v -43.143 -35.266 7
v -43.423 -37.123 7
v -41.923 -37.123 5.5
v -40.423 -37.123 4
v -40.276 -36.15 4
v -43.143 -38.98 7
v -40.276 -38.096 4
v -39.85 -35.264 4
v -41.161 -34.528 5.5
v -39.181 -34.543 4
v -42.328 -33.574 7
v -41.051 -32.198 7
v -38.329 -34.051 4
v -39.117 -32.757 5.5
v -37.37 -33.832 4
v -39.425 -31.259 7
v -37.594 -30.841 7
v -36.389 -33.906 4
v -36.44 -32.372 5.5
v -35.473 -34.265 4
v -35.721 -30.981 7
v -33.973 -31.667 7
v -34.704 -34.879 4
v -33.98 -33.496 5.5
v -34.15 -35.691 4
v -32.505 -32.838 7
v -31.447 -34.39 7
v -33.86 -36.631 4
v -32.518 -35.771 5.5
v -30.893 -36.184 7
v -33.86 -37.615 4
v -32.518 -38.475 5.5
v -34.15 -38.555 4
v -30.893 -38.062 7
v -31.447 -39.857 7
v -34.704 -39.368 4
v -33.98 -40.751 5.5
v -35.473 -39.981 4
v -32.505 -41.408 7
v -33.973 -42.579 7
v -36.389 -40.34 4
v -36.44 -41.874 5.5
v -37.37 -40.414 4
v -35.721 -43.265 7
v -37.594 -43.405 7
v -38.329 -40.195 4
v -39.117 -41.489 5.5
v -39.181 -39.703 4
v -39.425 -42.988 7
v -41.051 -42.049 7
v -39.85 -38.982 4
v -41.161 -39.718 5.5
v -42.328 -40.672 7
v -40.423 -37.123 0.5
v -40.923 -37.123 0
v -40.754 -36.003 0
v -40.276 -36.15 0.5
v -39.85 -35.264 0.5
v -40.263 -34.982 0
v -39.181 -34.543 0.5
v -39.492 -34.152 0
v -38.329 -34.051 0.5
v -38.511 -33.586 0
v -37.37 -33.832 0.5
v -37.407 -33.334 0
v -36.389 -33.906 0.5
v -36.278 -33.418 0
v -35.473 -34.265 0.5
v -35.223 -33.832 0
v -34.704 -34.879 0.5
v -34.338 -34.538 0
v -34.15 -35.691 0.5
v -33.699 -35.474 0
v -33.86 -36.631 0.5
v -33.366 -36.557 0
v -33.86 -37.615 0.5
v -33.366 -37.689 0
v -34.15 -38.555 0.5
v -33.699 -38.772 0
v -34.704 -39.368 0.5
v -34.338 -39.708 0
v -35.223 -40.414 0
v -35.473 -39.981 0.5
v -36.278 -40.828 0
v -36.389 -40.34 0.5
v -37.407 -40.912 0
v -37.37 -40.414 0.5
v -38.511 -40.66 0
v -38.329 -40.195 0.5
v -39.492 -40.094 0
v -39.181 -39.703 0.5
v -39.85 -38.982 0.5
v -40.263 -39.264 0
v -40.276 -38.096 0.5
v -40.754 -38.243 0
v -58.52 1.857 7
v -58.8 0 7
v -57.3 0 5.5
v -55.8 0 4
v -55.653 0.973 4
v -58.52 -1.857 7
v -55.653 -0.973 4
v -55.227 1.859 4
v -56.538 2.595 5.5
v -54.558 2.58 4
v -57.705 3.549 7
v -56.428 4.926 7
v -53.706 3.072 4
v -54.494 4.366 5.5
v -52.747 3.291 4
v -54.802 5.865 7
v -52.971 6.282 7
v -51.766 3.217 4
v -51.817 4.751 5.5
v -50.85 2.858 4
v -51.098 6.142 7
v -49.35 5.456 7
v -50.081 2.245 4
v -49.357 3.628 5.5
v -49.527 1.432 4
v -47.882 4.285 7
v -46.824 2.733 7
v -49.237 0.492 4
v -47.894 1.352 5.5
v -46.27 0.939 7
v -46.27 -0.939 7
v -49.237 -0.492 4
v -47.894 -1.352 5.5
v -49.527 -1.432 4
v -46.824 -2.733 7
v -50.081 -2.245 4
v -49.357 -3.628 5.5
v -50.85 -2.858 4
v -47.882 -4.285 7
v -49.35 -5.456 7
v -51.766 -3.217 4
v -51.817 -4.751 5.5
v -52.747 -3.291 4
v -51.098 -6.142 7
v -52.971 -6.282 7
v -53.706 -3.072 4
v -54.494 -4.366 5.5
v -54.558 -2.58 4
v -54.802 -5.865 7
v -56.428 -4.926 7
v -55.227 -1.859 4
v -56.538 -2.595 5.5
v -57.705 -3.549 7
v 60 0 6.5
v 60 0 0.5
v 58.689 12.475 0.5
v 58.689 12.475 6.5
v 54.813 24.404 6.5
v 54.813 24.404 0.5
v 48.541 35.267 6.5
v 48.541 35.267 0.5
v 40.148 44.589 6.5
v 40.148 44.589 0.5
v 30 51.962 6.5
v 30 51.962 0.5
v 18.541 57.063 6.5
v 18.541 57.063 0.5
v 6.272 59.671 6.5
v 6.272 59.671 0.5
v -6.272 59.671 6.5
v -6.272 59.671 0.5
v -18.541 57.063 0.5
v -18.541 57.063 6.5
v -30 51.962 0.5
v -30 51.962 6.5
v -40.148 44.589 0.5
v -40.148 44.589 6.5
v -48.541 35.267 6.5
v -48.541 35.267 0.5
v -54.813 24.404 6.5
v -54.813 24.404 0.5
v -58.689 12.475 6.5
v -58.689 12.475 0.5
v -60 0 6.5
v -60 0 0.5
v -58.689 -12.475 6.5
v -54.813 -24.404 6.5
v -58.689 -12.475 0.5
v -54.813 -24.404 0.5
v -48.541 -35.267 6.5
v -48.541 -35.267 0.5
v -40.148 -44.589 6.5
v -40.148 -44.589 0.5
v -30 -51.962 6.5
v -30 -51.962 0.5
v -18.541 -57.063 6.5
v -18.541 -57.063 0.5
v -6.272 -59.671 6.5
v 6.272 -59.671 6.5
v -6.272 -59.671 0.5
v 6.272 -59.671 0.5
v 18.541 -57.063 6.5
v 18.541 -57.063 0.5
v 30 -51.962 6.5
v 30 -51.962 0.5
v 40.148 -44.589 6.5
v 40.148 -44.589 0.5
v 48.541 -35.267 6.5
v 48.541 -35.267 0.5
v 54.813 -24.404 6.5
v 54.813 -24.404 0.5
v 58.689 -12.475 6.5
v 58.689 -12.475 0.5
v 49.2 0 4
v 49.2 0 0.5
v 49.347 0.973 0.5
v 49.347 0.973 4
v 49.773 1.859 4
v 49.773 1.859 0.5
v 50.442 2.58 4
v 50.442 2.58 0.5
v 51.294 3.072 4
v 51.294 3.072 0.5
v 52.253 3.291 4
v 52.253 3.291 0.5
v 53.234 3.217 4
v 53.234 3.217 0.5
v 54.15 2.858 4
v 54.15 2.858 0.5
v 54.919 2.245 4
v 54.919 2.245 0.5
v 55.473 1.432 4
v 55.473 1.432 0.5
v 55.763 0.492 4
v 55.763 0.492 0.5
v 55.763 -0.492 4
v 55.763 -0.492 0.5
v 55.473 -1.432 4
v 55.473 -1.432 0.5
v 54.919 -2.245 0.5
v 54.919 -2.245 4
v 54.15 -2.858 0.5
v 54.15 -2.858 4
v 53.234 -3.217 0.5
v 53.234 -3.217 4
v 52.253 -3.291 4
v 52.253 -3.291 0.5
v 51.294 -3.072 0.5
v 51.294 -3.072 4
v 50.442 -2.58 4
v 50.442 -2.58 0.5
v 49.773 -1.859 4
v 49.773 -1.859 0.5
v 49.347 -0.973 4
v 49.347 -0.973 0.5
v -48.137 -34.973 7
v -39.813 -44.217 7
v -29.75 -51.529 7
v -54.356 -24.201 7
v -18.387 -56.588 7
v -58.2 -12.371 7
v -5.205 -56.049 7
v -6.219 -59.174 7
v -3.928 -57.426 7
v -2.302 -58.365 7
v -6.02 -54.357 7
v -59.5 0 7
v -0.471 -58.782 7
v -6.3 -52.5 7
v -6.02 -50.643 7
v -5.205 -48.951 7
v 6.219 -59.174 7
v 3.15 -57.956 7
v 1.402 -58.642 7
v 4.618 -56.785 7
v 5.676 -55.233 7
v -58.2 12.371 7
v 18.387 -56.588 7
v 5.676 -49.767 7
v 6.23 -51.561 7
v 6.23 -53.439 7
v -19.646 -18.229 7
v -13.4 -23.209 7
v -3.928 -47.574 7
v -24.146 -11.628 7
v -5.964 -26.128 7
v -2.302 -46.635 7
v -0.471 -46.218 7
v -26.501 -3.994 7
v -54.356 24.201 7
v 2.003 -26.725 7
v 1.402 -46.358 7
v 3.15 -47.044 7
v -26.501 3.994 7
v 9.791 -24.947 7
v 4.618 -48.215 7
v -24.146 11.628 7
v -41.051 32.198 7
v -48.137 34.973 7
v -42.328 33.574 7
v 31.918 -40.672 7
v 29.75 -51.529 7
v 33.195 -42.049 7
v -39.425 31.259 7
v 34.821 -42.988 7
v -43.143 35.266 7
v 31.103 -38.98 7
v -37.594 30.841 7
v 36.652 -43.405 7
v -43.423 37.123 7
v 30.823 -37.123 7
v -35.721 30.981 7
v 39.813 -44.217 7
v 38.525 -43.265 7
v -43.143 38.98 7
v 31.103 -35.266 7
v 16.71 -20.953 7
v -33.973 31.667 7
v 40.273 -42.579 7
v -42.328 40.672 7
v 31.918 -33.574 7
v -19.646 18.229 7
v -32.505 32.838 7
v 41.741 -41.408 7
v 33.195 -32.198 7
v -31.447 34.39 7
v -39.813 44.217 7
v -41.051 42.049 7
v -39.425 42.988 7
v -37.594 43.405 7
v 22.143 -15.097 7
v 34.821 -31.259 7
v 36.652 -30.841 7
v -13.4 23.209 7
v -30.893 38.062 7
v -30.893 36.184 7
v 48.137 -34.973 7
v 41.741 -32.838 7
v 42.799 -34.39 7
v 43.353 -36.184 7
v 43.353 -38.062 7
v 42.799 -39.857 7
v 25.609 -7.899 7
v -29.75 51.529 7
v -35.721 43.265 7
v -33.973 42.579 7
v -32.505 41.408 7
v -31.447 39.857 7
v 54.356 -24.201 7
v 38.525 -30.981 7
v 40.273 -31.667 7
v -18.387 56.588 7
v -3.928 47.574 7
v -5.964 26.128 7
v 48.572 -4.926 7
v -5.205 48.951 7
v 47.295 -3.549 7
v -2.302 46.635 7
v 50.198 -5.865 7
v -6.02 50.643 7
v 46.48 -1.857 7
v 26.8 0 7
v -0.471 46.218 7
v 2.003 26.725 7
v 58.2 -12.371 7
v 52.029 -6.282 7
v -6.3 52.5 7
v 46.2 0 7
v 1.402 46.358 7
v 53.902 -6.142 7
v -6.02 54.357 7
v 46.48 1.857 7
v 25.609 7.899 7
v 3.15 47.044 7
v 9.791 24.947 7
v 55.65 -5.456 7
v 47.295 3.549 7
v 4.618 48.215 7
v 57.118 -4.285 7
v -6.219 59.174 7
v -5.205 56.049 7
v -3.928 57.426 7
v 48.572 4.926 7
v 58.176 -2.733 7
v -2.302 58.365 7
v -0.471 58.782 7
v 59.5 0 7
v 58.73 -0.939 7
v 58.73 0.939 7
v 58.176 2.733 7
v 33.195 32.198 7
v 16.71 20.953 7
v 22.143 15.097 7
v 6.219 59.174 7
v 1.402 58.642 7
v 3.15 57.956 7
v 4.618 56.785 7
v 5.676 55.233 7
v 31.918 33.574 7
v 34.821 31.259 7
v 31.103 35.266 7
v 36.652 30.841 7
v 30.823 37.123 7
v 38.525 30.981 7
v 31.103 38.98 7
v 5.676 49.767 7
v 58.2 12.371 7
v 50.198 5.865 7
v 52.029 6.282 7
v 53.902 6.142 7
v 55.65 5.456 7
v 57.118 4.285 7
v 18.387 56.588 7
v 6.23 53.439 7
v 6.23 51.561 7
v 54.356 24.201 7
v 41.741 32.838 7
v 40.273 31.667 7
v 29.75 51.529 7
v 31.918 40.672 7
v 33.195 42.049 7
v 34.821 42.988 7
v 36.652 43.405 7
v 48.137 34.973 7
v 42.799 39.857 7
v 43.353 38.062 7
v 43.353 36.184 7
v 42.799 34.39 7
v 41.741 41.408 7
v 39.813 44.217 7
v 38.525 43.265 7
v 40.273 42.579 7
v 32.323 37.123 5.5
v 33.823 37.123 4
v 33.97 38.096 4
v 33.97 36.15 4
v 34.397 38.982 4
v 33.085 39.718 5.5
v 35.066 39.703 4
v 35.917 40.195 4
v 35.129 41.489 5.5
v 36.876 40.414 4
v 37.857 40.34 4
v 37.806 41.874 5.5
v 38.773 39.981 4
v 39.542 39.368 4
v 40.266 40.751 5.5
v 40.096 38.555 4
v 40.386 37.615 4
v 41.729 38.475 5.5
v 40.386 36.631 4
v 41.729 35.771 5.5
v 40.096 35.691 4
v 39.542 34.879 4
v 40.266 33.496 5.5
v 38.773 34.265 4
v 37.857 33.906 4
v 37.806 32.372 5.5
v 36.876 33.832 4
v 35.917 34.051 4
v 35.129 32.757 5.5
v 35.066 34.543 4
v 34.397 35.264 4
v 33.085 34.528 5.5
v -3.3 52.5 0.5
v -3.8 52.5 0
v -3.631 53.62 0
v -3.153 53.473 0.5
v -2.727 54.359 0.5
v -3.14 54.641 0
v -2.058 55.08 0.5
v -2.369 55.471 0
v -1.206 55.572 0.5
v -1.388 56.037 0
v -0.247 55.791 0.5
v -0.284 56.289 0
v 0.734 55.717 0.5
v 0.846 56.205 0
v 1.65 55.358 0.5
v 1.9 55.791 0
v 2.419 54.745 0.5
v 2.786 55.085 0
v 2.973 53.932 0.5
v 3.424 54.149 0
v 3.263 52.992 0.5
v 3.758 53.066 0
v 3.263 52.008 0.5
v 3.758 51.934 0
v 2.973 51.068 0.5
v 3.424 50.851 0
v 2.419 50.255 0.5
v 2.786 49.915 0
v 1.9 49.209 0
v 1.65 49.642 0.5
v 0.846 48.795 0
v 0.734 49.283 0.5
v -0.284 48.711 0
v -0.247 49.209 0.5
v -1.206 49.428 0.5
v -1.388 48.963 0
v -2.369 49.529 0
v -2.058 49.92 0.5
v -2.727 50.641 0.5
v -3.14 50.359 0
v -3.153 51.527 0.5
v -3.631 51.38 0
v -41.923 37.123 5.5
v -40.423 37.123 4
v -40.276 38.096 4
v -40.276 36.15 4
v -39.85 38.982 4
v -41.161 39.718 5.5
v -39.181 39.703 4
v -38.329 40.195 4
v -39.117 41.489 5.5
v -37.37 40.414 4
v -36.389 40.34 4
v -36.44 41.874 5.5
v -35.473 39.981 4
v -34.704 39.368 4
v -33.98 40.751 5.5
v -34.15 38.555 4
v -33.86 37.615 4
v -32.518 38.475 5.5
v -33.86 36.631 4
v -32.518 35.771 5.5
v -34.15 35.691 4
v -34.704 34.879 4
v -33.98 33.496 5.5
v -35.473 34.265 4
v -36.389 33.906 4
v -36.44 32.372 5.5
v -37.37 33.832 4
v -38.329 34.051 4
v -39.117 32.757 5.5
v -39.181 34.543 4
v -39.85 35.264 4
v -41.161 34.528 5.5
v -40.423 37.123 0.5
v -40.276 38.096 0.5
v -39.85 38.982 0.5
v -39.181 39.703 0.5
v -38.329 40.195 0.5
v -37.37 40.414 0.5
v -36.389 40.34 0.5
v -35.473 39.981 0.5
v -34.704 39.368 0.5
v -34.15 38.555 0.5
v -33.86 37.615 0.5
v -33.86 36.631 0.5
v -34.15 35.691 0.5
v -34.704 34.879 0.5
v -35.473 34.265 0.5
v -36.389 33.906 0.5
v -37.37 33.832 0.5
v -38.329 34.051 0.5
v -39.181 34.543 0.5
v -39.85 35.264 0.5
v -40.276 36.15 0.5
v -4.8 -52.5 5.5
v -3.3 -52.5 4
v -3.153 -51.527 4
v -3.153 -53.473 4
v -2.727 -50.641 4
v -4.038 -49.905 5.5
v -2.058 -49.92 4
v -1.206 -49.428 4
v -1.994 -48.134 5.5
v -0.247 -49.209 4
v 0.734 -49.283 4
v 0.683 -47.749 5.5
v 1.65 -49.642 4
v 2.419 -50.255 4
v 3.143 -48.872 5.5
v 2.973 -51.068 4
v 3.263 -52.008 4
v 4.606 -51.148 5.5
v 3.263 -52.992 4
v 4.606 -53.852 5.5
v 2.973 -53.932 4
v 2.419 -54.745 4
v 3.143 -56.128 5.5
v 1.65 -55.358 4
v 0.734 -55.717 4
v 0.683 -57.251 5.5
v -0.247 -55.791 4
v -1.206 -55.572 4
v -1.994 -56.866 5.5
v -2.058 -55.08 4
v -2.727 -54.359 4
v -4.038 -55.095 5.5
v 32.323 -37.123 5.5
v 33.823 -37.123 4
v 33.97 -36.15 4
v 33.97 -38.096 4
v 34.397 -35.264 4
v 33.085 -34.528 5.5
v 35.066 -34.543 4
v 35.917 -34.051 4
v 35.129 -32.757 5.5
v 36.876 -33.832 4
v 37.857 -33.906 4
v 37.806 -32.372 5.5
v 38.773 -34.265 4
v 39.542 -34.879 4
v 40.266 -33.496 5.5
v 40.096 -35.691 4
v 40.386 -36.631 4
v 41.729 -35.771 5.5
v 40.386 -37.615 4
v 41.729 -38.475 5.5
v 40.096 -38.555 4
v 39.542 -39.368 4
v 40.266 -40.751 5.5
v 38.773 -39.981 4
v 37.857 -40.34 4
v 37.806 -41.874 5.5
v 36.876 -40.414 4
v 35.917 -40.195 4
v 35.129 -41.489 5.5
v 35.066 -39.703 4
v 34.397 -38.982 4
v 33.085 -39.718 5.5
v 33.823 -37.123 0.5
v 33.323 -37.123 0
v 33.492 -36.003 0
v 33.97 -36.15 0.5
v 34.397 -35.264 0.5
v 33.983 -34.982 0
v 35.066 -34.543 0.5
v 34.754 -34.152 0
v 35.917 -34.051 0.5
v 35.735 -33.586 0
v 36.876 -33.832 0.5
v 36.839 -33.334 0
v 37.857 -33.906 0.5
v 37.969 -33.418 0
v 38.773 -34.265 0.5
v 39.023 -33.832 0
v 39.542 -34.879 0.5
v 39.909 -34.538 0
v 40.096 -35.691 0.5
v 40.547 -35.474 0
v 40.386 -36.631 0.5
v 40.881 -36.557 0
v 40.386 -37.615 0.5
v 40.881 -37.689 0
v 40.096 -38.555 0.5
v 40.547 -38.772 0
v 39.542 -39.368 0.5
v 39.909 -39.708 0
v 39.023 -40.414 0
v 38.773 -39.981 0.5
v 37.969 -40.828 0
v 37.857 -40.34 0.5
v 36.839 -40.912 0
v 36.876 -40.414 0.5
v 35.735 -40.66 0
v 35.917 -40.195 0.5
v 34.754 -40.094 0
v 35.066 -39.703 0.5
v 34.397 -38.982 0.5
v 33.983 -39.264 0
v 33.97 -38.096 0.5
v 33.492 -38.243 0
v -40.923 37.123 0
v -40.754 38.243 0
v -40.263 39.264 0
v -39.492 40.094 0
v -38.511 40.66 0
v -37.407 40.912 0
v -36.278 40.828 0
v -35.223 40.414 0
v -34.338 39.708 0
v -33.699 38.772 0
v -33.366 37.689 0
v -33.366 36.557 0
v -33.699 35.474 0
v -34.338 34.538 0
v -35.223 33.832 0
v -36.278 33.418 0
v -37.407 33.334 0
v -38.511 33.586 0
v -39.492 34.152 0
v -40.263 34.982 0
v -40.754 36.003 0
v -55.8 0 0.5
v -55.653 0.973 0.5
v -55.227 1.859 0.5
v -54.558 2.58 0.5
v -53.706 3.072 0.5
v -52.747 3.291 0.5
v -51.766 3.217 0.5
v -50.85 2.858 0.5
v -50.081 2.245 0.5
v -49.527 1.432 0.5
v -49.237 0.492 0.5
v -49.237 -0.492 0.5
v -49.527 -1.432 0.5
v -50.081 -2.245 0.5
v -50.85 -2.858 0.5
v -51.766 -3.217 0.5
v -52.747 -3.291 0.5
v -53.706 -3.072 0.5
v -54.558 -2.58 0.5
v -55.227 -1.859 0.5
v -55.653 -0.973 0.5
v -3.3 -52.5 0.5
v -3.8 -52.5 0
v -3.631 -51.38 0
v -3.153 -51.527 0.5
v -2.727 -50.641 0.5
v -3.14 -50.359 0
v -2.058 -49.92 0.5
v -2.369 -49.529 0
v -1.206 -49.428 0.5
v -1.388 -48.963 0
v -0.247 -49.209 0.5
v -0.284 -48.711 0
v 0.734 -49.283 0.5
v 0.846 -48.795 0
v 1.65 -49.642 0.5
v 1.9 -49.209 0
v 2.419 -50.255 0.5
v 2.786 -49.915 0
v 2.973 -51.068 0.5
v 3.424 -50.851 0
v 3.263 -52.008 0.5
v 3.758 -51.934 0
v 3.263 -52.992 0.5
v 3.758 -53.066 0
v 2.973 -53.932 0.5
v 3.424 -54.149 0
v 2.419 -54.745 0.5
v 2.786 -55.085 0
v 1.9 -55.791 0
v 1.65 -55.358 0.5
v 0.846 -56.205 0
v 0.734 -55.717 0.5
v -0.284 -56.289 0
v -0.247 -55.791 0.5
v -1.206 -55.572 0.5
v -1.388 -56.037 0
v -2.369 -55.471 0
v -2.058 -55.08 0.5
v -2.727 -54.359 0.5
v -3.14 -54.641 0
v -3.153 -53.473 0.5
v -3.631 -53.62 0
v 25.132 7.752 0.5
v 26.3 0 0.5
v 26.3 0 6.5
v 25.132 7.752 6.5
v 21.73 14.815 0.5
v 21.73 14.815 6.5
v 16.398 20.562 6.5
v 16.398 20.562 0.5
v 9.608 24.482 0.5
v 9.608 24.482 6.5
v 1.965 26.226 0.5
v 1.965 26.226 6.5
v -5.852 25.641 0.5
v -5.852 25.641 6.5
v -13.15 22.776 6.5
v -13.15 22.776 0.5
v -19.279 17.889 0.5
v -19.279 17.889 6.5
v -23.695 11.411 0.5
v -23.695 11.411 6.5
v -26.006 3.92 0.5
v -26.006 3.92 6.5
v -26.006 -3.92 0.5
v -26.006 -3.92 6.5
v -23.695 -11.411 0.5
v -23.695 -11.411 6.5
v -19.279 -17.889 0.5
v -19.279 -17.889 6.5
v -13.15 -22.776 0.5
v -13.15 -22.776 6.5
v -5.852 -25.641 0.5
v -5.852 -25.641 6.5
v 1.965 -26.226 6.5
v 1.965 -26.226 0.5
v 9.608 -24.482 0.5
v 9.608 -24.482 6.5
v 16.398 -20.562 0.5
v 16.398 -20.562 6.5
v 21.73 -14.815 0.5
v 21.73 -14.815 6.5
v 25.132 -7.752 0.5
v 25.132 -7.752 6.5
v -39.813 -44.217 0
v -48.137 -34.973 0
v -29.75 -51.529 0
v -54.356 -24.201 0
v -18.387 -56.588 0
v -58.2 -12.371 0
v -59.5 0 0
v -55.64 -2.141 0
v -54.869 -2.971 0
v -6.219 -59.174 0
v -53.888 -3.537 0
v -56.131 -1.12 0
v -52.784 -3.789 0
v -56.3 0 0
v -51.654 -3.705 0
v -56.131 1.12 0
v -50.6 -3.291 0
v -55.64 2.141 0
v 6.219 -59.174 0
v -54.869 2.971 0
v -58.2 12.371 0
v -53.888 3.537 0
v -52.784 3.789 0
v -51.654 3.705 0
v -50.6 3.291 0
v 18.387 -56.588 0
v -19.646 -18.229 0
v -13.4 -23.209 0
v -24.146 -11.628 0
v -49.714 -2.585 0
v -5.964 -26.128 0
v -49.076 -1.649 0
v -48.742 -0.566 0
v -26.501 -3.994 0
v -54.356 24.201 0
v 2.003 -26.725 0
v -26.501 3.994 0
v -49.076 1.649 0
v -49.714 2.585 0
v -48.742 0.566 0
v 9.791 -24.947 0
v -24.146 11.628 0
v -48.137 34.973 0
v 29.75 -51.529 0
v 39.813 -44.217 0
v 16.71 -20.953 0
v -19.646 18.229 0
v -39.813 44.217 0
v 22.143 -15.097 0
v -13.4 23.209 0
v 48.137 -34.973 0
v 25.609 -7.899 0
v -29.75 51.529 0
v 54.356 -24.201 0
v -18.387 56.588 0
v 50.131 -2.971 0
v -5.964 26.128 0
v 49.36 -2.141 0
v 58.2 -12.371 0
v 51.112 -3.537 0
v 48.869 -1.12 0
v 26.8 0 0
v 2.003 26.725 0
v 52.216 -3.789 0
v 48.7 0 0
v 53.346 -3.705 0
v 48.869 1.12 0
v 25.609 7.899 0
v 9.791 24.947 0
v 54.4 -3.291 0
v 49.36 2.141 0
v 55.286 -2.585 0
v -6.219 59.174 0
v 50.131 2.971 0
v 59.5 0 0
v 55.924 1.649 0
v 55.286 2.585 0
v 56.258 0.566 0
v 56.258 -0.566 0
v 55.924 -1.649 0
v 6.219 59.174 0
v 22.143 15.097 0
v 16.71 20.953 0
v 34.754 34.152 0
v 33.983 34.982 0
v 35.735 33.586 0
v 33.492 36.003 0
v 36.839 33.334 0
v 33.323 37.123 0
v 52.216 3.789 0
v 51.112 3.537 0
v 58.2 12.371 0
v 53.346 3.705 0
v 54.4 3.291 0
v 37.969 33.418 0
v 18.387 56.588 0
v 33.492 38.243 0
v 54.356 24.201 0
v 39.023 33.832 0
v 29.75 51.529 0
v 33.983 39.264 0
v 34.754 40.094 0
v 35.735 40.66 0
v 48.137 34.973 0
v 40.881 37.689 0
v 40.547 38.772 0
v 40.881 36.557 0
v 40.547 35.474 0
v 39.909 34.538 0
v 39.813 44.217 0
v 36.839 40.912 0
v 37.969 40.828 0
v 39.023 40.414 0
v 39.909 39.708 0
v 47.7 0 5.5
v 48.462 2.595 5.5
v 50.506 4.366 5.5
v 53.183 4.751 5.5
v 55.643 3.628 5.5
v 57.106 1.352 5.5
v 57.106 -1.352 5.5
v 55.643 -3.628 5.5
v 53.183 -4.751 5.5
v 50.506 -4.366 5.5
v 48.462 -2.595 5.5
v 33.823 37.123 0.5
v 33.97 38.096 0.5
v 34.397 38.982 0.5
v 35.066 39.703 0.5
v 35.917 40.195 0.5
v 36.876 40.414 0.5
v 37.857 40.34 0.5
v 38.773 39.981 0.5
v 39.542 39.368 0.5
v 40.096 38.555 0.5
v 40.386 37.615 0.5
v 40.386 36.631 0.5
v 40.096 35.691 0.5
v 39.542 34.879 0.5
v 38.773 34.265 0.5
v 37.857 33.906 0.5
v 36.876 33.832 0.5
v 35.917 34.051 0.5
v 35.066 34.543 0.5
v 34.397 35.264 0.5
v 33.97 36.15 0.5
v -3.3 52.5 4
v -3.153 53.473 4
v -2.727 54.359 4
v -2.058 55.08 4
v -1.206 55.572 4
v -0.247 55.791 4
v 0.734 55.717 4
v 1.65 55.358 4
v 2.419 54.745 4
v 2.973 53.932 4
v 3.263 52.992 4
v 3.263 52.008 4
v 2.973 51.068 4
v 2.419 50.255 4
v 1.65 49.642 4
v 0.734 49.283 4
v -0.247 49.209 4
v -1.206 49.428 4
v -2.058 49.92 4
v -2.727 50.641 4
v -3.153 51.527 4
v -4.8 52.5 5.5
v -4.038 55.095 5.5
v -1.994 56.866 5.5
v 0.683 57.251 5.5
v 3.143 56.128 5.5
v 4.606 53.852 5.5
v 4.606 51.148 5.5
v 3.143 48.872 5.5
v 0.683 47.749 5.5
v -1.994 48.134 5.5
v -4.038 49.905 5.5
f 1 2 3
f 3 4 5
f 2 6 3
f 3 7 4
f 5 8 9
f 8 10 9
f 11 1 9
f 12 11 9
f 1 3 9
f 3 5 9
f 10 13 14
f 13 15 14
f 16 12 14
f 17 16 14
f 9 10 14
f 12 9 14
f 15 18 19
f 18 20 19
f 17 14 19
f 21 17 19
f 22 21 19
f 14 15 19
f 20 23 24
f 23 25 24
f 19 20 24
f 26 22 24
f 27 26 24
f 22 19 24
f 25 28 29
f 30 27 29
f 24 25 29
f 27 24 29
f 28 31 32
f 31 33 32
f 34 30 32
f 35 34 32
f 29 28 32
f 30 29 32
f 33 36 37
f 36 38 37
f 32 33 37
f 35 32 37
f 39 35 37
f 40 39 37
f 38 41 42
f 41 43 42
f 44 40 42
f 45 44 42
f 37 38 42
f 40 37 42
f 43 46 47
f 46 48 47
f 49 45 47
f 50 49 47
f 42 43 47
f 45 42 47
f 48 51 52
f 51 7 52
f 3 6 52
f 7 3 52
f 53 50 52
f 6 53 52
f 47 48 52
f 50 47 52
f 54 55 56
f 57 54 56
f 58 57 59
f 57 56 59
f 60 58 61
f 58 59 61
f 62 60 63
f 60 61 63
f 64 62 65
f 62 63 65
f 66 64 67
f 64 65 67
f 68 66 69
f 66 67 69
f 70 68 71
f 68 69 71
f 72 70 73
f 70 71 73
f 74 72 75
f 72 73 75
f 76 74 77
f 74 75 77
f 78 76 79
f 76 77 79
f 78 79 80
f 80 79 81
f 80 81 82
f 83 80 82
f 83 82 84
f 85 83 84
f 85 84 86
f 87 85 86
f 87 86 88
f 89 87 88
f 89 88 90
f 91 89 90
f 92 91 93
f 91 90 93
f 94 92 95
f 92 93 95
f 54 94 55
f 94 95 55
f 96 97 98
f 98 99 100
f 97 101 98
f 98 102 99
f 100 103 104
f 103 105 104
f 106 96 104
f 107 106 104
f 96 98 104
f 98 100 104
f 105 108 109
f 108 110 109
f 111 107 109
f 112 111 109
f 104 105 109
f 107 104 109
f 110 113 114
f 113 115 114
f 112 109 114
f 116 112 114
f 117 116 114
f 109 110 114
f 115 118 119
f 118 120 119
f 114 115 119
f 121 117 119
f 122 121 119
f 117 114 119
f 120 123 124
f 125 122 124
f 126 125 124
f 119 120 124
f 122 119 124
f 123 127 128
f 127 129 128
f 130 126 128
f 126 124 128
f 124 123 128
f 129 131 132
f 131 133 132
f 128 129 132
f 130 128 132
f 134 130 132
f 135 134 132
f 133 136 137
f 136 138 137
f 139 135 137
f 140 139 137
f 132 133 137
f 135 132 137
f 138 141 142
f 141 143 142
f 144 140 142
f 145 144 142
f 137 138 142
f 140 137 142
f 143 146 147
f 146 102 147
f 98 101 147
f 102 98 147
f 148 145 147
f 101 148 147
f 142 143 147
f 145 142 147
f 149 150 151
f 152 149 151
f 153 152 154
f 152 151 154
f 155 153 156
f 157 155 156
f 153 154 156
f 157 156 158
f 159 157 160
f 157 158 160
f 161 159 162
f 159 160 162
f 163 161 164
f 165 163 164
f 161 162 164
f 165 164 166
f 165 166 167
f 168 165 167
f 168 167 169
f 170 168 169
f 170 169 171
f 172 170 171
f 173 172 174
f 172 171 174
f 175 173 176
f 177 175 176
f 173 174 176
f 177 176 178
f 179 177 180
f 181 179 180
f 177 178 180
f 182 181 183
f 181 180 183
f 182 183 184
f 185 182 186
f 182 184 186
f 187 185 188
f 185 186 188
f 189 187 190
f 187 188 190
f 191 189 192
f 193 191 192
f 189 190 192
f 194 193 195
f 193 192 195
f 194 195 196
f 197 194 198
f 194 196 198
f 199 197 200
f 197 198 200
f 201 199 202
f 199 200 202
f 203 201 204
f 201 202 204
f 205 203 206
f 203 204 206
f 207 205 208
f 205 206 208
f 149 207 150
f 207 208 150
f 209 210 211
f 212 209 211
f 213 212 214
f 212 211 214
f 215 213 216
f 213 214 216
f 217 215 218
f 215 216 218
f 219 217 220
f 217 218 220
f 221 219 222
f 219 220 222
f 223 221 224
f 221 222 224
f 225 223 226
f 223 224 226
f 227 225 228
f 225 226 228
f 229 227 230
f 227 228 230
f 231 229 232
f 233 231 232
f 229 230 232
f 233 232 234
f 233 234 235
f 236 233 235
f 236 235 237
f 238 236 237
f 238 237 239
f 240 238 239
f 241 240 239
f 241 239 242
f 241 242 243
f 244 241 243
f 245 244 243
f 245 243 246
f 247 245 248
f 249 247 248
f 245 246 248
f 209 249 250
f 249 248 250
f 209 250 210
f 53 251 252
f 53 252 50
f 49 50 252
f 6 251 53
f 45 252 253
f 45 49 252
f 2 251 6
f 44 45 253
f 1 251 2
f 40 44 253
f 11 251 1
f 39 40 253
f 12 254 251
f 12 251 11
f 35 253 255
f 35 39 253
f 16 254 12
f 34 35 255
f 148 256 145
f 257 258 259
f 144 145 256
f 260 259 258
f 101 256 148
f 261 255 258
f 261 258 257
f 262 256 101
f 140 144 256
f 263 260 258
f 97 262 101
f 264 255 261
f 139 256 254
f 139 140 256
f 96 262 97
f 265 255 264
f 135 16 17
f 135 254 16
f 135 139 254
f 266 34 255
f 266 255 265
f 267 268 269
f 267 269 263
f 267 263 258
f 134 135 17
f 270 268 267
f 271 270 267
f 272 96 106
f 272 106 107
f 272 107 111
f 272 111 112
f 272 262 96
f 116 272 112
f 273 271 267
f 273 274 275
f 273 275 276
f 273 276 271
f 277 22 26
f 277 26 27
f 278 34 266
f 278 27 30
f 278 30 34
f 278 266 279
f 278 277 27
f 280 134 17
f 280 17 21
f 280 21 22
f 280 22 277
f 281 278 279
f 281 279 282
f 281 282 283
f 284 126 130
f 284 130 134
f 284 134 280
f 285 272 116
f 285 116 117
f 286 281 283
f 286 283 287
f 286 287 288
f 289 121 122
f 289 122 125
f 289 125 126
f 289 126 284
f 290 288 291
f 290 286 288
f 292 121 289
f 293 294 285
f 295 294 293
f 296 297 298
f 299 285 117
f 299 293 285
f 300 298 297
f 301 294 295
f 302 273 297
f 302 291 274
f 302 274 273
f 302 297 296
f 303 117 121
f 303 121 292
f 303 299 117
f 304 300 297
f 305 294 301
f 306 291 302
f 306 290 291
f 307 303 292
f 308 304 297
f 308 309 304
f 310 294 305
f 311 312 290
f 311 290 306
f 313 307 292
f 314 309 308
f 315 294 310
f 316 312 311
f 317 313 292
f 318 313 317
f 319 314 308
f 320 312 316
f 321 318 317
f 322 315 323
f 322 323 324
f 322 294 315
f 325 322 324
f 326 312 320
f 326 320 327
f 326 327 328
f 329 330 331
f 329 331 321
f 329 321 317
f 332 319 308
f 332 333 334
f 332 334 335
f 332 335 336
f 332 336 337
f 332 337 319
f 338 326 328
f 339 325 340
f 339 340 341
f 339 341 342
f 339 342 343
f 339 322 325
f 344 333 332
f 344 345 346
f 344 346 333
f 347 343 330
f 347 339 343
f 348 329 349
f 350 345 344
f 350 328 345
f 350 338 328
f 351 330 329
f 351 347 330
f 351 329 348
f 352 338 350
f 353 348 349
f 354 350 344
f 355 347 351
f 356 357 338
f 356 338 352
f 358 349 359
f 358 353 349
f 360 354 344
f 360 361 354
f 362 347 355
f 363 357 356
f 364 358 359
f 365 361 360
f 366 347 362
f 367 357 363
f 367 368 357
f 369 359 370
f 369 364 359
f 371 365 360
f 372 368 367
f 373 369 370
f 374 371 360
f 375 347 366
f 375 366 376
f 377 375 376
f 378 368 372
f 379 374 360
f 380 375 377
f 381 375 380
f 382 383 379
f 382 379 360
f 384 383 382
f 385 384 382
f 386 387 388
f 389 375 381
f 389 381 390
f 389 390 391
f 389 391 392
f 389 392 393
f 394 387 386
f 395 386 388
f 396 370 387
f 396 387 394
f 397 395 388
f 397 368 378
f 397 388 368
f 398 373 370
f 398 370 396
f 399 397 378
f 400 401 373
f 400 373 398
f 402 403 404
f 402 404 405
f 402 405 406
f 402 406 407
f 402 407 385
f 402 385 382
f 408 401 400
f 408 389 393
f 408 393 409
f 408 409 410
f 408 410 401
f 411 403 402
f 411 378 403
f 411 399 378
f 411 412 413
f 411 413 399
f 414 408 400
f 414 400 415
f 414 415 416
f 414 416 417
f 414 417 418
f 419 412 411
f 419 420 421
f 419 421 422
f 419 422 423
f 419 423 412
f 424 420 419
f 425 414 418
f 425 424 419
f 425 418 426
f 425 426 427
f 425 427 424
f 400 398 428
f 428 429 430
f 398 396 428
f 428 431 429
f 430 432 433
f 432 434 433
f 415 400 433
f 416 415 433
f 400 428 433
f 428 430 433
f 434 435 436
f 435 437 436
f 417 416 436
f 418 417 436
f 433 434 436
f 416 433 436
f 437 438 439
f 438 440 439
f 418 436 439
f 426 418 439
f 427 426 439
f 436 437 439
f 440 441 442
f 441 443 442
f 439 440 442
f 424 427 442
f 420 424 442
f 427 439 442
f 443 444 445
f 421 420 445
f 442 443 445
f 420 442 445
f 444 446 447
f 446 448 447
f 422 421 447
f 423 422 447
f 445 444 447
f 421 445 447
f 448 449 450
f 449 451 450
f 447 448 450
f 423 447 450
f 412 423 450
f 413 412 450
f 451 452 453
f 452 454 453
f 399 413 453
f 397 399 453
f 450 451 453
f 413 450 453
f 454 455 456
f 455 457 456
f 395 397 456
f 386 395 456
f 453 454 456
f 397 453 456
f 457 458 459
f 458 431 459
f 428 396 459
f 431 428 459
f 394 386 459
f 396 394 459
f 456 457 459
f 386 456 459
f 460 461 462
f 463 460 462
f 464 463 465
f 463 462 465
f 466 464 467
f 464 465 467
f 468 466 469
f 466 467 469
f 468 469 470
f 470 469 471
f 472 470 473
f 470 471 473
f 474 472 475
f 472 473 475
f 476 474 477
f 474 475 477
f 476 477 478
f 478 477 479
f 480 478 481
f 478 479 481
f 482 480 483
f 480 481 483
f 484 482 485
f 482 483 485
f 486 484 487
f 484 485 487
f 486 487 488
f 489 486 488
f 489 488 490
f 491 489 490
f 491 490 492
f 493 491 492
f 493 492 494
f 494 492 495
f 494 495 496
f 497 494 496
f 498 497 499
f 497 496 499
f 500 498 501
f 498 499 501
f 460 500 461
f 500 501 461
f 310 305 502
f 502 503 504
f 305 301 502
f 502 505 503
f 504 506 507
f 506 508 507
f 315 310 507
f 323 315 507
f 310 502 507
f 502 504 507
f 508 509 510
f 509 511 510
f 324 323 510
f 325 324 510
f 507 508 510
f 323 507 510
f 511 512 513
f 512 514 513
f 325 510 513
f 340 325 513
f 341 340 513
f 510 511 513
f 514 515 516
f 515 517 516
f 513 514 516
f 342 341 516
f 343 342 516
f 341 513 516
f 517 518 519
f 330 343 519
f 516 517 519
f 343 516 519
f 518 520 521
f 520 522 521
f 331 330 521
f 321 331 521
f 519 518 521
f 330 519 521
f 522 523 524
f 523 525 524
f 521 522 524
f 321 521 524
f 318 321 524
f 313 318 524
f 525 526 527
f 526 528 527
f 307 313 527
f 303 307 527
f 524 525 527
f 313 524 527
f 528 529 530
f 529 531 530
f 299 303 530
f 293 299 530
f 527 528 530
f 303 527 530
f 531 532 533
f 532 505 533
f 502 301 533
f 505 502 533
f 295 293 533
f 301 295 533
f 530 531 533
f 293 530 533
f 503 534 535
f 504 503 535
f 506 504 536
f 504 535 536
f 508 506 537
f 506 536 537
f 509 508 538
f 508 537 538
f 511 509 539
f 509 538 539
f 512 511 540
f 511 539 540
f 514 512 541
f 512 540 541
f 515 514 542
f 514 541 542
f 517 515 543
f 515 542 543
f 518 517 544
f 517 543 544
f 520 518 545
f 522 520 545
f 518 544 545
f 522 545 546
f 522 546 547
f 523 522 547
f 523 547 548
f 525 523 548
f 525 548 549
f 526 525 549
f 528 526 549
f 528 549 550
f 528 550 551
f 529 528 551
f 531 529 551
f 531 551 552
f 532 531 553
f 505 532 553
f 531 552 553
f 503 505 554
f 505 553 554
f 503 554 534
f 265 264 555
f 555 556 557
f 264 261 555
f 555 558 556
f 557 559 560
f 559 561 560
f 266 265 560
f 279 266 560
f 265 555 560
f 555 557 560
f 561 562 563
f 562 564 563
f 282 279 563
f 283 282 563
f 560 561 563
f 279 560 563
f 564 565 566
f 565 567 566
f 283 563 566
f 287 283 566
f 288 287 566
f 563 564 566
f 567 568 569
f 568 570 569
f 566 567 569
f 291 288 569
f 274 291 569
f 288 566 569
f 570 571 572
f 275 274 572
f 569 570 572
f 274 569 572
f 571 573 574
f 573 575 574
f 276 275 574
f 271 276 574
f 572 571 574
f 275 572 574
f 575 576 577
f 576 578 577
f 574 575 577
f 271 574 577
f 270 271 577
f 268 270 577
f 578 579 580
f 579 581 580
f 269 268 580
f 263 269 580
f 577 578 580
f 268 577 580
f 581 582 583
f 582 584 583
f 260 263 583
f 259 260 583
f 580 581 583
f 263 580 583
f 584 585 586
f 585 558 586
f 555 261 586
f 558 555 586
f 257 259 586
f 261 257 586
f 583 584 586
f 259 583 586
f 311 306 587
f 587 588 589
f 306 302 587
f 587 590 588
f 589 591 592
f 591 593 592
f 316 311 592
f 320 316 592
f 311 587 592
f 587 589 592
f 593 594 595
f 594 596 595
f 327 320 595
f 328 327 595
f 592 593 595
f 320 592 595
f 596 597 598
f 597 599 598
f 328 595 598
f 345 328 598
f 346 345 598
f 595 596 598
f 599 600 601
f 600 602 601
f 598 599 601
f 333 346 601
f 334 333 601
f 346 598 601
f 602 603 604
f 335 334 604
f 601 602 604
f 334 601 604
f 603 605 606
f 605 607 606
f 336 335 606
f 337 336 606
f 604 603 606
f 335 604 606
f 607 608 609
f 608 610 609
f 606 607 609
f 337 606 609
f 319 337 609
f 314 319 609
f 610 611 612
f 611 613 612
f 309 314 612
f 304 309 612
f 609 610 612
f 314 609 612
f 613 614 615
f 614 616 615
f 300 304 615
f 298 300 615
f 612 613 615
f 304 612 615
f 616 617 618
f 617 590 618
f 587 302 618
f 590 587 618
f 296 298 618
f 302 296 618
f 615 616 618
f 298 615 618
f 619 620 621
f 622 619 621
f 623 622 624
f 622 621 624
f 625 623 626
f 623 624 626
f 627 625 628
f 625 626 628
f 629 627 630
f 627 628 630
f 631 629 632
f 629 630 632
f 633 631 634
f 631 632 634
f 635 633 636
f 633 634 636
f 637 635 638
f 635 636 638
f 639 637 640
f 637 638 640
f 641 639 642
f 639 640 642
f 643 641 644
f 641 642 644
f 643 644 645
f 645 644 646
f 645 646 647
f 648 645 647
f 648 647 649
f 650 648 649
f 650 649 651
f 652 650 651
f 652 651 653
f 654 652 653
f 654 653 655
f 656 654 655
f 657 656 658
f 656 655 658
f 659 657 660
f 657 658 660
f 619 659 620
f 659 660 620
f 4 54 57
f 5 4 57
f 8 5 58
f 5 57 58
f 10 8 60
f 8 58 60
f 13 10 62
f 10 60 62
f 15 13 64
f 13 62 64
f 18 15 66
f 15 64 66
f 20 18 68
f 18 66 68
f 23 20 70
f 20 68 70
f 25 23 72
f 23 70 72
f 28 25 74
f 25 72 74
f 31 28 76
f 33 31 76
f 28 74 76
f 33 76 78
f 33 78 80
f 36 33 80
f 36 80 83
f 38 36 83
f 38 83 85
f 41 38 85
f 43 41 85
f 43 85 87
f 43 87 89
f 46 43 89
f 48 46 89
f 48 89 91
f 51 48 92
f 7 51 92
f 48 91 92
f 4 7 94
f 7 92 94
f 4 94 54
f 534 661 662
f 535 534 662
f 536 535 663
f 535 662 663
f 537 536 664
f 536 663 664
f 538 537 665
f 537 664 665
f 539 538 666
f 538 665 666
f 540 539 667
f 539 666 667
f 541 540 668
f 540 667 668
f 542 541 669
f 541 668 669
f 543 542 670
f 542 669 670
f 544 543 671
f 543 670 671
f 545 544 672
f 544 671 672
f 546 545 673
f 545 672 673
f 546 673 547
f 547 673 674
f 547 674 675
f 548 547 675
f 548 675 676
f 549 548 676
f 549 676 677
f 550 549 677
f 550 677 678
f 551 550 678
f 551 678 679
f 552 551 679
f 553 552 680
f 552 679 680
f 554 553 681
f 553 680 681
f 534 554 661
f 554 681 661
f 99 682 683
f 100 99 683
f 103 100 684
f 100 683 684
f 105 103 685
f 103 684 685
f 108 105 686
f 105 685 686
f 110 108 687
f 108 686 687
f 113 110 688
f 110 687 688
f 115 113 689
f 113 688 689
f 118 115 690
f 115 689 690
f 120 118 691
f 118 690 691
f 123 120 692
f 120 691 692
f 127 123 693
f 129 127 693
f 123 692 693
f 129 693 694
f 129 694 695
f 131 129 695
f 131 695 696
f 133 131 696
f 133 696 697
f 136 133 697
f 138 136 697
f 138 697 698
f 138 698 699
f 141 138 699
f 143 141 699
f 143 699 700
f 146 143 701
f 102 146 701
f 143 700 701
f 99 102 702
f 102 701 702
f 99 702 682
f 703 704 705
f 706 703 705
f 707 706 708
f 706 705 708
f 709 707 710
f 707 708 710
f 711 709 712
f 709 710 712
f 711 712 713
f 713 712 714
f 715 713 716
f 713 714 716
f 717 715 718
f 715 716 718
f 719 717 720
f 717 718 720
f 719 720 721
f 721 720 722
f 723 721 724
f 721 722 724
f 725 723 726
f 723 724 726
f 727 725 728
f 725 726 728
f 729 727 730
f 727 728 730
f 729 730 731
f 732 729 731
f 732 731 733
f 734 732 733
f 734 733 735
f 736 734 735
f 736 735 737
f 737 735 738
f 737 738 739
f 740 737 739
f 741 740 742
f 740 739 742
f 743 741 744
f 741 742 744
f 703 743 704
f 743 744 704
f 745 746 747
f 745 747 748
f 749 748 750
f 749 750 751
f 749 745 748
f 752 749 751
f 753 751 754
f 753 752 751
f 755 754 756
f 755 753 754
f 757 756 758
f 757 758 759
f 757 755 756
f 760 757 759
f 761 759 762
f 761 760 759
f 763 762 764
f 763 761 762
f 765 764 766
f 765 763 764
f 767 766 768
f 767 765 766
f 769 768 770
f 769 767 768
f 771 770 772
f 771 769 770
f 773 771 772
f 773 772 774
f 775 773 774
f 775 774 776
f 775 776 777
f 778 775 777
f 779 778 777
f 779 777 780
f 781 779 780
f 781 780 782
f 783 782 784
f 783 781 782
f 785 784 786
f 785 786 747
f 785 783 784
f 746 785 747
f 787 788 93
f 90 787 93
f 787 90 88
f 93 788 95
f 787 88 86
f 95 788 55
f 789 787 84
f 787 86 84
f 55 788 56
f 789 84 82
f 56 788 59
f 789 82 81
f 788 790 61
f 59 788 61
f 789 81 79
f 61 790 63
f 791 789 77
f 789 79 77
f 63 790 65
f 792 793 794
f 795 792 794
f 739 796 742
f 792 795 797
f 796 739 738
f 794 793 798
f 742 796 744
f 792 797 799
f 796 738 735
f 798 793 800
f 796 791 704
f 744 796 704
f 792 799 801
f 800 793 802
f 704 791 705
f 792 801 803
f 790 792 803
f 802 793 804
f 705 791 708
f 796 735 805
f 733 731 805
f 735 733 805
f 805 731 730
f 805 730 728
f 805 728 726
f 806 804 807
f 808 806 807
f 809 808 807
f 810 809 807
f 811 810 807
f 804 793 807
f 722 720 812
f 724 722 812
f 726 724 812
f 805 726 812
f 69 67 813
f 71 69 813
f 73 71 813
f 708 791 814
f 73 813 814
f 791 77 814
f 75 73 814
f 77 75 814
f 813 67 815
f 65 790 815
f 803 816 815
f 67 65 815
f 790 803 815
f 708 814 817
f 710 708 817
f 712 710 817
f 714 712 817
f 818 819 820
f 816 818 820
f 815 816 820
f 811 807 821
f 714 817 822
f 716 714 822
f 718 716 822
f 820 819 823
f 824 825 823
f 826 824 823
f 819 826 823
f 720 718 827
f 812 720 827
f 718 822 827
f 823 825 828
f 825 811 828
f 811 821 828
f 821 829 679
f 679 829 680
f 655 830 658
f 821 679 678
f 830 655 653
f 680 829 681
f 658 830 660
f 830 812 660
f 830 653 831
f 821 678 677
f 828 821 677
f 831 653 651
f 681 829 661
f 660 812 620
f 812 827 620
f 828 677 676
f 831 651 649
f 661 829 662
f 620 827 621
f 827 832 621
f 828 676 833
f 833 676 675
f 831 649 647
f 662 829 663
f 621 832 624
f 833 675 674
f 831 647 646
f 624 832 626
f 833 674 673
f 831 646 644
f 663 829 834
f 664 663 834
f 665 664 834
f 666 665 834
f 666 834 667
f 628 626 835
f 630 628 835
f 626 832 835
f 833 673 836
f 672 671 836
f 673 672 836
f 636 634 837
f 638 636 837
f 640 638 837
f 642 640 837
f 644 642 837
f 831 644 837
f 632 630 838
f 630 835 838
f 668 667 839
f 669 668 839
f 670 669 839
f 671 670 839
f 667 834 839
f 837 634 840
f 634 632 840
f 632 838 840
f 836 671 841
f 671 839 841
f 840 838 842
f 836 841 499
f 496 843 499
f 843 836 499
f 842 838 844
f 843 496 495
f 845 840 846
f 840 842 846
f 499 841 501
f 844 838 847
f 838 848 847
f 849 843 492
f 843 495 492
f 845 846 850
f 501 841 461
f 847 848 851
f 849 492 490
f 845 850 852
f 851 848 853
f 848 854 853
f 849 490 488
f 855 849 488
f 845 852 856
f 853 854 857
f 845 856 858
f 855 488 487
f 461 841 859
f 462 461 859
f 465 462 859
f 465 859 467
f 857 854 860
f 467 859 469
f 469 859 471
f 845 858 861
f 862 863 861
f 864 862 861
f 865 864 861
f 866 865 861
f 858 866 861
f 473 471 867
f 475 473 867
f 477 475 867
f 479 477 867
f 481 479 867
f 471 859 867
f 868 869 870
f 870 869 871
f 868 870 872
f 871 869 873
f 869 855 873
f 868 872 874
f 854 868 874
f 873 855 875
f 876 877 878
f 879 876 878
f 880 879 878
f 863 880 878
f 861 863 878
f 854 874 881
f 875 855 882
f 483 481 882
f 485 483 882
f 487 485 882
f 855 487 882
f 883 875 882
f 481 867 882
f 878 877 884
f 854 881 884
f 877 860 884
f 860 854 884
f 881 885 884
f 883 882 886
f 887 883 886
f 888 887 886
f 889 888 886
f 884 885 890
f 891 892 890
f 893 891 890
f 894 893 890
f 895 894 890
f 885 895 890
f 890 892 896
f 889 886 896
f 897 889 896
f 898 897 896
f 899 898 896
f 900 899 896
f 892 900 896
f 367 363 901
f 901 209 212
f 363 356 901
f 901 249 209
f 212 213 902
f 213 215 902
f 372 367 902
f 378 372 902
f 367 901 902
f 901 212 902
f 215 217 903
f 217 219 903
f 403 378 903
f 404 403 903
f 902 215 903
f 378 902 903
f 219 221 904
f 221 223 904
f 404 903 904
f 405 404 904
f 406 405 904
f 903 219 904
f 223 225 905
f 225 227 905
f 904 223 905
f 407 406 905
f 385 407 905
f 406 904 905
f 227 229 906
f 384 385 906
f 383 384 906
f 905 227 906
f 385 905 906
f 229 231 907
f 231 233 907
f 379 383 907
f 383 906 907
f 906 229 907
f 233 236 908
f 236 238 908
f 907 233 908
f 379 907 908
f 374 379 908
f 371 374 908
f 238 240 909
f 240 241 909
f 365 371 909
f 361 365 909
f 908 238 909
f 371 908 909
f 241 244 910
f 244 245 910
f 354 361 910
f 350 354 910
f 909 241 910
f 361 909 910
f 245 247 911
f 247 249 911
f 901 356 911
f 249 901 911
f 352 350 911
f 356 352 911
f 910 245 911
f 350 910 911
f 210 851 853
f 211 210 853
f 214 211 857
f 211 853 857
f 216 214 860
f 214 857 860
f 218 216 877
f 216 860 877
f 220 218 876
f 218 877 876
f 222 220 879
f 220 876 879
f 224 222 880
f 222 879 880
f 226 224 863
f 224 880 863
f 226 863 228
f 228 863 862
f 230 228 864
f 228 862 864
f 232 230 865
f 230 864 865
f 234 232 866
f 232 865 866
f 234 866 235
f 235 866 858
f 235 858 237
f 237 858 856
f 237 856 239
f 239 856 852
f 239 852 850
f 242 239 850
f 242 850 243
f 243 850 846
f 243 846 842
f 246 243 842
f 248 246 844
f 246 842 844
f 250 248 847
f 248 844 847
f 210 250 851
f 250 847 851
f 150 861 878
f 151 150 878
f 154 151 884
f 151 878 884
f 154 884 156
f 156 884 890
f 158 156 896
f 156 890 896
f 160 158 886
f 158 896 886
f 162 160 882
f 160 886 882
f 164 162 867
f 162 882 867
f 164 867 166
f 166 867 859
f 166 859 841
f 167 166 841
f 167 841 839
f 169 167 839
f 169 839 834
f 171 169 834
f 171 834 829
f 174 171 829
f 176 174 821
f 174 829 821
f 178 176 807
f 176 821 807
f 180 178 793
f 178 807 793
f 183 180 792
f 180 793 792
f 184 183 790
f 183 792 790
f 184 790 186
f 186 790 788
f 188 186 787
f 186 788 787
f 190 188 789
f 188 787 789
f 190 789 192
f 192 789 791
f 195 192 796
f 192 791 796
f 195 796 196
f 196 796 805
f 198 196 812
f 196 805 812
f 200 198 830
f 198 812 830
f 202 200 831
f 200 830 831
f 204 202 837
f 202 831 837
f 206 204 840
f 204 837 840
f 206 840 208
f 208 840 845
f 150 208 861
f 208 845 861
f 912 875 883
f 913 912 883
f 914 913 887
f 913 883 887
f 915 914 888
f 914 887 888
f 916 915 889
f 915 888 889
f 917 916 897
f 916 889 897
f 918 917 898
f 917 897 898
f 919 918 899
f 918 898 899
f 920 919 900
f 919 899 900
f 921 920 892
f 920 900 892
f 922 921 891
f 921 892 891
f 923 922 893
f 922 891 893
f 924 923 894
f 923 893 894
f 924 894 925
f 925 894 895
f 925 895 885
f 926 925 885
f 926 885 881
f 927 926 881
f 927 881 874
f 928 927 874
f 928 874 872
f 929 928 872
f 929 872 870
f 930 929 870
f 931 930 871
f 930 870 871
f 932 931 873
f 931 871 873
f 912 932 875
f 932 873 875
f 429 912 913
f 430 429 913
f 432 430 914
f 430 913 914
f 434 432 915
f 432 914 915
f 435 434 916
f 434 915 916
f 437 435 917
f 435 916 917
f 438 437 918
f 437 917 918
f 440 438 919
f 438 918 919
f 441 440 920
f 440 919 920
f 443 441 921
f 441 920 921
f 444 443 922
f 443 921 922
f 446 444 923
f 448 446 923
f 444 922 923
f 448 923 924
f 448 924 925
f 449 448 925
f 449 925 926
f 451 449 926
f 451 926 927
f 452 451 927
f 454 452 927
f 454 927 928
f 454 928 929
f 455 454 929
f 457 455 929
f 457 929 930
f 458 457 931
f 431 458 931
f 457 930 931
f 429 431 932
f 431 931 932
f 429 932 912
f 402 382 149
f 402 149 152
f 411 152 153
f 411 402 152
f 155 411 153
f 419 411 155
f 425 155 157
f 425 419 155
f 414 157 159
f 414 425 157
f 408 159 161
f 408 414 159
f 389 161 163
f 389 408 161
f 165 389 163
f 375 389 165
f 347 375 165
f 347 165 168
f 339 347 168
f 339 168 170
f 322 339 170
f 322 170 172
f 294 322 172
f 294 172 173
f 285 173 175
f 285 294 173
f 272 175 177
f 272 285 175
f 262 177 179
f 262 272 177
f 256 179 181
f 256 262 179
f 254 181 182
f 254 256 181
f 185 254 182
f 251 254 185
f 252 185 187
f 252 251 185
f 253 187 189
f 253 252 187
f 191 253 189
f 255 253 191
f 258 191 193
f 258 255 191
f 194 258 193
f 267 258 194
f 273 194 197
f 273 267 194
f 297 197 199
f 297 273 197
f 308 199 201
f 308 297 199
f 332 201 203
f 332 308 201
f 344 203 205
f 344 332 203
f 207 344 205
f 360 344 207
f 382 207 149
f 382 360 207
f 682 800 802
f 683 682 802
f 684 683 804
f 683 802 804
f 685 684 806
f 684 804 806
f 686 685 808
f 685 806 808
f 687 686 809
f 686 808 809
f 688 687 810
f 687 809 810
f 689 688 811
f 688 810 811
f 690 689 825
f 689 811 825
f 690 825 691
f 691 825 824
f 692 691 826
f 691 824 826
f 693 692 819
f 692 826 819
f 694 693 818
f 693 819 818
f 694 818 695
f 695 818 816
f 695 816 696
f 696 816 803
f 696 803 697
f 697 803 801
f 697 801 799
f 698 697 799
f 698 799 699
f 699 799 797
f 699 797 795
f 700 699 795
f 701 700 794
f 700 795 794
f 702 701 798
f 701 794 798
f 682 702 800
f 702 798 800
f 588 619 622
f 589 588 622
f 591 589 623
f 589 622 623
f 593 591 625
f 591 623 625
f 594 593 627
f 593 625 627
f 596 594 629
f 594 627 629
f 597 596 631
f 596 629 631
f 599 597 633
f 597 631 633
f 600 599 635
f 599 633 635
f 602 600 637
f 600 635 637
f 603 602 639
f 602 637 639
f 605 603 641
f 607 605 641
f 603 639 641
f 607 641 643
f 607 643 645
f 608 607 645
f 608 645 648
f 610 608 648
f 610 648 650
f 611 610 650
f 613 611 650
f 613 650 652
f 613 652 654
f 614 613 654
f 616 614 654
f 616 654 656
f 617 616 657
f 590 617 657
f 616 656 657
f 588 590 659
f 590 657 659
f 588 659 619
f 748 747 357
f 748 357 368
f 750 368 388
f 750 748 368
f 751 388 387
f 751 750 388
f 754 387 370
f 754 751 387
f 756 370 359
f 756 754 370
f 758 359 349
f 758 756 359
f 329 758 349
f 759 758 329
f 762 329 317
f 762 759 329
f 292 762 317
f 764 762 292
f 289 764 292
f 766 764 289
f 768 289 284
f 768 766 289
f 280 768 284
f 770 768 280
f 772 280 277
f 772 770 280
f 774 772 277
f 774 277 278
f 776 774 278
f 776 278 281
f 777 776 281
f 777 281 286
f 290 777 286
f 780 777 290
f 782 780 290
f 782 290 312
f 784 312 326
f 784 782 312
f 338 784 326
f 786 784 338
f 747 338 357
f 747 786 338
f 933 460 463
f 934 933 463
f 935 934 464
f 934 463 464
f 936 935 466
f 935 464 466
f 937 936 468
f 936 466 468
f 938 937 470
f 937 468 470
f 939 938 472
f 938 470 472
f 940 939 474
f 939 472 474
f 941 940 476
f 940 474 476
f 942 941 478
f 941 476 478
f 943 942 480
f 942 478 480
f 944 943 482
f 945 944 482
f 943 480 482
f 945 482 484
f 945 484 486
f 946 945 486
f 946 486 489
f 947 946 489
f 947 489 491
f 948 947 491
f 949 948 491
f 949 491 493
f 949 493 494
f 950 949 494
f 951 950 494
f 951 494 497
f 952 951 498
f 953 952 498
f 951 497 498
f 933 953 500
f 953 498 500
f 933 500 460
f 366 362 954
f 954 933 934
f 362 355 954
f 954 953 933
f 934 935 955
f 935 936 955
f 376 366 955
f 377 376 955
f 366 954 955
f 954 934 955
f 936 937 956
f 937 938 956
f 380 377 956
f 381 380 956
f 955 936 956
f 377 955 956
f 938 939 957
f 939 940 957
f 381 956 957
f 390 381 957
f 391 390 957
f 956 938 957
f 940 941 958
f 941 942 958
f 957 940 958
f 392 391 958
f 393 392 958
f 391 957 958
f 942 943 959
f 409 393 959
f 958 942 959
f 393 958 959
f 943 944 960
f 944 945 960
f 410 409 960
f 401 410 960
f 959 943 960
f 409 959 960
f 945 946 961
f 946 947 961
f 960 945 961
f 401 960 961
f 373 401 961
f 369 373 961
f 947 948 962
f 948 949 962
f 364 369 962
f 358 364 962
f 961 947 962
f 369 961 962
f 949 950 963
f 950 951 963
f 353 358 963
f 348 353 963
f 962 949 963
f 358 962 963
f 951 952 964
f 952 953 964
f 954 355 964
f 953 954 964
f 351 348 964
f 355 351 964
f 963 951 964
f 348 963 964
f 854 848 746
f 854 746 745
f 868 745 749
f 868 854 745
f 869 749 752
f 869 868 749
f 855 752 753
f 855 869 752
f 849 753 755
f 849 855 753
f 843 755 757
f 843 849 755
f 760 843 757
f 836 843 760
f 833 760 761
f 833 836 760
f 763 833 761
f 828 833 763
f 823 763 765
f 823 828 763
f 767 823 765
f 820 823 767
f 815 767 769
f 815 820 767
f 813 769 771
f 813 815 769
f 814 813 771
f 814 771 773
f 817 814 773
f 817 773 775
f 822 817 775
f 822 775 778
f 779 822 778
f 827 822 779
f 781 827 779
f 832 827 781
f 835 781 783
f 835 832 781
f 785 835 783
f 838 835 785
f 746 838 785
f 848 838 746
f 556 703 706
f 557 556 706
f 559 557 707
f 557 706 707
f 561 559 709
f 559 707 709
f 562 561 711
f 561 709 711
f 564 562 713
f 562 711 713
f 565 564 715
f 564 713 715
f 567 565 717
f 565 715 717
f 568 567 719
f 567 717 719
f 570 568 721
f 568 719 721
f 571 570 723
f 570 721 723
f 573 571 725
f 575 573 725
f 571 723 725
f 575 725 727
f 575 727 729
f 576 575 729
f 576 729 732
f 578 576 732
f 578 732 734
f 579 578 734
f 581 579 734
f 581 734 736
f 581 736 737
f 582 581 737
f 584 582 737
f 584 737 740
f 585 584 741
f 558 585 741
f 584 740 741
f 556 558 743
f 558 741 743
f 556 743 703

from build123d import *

# Parameters (mm, degrees)
SKETCH1_R                                           = 60
SKETCH1_R_2                                         = 26.3
BOSS_EXTRUDE1_DEPTH                                 = 7
CSK_FOR_M6_COUNTERSUNK_FLAT_HEAD_SCREW1_D           = 6.6
CSK_FOR_M6_COUNTERSUNK_FLAT_HEAD_SCREW1_CSINK_D     = 12.6
CSK_FOR_M6_COUNTERSUNK_FLAT_HEAD_SCREW1_CSINK_ANGLE = 90
CHAMFER1_SIZE                                       = 0.5


with BuildPart() as part:
    # Sketch1 → Boss-Extrude1 (new body)
    with BuildSketch(Plane.XY):
        Circle(SKETCH1_R)
        Circle(SKETCH1_R_2, mode=Mode.SUBTRACT)
    extrude(amount=BOSS_EXTRUDE1_DEPTH)

    # CSK for M6 Countersunk Flat Head Screw1 (through all)
    with Locations(Plane.XY.offset(7)):
        with Locations((-37.123106012, 37.123106012), (0, 52.5), (37.123106012, 37.123106012), (52.5, 0), (37.123106012, -37.123106012), (0, -52.5), (-37.123106012, -37.123106012), (-52.5, 0)):
            CounterSinkHole(CSK_FOR_M6_COUNTERSUNK_FLAT_HEAD_SCREW1_D / 2, CSK_FOR_M6_COUNTERSUNK_FLAT_HEAD_SCREW1_CSINK_D / 2, counter_sink_angle=CSK_FOR_M6_COUNTERSUNK_FLAT_HEAD_SCREW1_CSINK_ANGLE)

    # Chamfer1
    chamfer1_edges = [part.edges().sort_by_distance(p)[0] for p in [
        (-33.823106012, 37.123106012, 0),
        (-60, 0, 0),
        (-49.2, 0, 0),
        (-33.823106012, -37.123106012, 0),
        (3.3, -52.5, 0),
        (40.423106012, -37.123106012, 0),
        (55.8, 0, 0),
        (-60, 0, 7),
        (-26.3, 0, 0),
        (40.423106012, 37.123106012, 0),
        (-26.3, 0, 7),
        (3.3, 52.5, 0),
    ]]
    chamfer(chamfer1_edges, length=CHAMFER1_SIZE)


solid = part.part
